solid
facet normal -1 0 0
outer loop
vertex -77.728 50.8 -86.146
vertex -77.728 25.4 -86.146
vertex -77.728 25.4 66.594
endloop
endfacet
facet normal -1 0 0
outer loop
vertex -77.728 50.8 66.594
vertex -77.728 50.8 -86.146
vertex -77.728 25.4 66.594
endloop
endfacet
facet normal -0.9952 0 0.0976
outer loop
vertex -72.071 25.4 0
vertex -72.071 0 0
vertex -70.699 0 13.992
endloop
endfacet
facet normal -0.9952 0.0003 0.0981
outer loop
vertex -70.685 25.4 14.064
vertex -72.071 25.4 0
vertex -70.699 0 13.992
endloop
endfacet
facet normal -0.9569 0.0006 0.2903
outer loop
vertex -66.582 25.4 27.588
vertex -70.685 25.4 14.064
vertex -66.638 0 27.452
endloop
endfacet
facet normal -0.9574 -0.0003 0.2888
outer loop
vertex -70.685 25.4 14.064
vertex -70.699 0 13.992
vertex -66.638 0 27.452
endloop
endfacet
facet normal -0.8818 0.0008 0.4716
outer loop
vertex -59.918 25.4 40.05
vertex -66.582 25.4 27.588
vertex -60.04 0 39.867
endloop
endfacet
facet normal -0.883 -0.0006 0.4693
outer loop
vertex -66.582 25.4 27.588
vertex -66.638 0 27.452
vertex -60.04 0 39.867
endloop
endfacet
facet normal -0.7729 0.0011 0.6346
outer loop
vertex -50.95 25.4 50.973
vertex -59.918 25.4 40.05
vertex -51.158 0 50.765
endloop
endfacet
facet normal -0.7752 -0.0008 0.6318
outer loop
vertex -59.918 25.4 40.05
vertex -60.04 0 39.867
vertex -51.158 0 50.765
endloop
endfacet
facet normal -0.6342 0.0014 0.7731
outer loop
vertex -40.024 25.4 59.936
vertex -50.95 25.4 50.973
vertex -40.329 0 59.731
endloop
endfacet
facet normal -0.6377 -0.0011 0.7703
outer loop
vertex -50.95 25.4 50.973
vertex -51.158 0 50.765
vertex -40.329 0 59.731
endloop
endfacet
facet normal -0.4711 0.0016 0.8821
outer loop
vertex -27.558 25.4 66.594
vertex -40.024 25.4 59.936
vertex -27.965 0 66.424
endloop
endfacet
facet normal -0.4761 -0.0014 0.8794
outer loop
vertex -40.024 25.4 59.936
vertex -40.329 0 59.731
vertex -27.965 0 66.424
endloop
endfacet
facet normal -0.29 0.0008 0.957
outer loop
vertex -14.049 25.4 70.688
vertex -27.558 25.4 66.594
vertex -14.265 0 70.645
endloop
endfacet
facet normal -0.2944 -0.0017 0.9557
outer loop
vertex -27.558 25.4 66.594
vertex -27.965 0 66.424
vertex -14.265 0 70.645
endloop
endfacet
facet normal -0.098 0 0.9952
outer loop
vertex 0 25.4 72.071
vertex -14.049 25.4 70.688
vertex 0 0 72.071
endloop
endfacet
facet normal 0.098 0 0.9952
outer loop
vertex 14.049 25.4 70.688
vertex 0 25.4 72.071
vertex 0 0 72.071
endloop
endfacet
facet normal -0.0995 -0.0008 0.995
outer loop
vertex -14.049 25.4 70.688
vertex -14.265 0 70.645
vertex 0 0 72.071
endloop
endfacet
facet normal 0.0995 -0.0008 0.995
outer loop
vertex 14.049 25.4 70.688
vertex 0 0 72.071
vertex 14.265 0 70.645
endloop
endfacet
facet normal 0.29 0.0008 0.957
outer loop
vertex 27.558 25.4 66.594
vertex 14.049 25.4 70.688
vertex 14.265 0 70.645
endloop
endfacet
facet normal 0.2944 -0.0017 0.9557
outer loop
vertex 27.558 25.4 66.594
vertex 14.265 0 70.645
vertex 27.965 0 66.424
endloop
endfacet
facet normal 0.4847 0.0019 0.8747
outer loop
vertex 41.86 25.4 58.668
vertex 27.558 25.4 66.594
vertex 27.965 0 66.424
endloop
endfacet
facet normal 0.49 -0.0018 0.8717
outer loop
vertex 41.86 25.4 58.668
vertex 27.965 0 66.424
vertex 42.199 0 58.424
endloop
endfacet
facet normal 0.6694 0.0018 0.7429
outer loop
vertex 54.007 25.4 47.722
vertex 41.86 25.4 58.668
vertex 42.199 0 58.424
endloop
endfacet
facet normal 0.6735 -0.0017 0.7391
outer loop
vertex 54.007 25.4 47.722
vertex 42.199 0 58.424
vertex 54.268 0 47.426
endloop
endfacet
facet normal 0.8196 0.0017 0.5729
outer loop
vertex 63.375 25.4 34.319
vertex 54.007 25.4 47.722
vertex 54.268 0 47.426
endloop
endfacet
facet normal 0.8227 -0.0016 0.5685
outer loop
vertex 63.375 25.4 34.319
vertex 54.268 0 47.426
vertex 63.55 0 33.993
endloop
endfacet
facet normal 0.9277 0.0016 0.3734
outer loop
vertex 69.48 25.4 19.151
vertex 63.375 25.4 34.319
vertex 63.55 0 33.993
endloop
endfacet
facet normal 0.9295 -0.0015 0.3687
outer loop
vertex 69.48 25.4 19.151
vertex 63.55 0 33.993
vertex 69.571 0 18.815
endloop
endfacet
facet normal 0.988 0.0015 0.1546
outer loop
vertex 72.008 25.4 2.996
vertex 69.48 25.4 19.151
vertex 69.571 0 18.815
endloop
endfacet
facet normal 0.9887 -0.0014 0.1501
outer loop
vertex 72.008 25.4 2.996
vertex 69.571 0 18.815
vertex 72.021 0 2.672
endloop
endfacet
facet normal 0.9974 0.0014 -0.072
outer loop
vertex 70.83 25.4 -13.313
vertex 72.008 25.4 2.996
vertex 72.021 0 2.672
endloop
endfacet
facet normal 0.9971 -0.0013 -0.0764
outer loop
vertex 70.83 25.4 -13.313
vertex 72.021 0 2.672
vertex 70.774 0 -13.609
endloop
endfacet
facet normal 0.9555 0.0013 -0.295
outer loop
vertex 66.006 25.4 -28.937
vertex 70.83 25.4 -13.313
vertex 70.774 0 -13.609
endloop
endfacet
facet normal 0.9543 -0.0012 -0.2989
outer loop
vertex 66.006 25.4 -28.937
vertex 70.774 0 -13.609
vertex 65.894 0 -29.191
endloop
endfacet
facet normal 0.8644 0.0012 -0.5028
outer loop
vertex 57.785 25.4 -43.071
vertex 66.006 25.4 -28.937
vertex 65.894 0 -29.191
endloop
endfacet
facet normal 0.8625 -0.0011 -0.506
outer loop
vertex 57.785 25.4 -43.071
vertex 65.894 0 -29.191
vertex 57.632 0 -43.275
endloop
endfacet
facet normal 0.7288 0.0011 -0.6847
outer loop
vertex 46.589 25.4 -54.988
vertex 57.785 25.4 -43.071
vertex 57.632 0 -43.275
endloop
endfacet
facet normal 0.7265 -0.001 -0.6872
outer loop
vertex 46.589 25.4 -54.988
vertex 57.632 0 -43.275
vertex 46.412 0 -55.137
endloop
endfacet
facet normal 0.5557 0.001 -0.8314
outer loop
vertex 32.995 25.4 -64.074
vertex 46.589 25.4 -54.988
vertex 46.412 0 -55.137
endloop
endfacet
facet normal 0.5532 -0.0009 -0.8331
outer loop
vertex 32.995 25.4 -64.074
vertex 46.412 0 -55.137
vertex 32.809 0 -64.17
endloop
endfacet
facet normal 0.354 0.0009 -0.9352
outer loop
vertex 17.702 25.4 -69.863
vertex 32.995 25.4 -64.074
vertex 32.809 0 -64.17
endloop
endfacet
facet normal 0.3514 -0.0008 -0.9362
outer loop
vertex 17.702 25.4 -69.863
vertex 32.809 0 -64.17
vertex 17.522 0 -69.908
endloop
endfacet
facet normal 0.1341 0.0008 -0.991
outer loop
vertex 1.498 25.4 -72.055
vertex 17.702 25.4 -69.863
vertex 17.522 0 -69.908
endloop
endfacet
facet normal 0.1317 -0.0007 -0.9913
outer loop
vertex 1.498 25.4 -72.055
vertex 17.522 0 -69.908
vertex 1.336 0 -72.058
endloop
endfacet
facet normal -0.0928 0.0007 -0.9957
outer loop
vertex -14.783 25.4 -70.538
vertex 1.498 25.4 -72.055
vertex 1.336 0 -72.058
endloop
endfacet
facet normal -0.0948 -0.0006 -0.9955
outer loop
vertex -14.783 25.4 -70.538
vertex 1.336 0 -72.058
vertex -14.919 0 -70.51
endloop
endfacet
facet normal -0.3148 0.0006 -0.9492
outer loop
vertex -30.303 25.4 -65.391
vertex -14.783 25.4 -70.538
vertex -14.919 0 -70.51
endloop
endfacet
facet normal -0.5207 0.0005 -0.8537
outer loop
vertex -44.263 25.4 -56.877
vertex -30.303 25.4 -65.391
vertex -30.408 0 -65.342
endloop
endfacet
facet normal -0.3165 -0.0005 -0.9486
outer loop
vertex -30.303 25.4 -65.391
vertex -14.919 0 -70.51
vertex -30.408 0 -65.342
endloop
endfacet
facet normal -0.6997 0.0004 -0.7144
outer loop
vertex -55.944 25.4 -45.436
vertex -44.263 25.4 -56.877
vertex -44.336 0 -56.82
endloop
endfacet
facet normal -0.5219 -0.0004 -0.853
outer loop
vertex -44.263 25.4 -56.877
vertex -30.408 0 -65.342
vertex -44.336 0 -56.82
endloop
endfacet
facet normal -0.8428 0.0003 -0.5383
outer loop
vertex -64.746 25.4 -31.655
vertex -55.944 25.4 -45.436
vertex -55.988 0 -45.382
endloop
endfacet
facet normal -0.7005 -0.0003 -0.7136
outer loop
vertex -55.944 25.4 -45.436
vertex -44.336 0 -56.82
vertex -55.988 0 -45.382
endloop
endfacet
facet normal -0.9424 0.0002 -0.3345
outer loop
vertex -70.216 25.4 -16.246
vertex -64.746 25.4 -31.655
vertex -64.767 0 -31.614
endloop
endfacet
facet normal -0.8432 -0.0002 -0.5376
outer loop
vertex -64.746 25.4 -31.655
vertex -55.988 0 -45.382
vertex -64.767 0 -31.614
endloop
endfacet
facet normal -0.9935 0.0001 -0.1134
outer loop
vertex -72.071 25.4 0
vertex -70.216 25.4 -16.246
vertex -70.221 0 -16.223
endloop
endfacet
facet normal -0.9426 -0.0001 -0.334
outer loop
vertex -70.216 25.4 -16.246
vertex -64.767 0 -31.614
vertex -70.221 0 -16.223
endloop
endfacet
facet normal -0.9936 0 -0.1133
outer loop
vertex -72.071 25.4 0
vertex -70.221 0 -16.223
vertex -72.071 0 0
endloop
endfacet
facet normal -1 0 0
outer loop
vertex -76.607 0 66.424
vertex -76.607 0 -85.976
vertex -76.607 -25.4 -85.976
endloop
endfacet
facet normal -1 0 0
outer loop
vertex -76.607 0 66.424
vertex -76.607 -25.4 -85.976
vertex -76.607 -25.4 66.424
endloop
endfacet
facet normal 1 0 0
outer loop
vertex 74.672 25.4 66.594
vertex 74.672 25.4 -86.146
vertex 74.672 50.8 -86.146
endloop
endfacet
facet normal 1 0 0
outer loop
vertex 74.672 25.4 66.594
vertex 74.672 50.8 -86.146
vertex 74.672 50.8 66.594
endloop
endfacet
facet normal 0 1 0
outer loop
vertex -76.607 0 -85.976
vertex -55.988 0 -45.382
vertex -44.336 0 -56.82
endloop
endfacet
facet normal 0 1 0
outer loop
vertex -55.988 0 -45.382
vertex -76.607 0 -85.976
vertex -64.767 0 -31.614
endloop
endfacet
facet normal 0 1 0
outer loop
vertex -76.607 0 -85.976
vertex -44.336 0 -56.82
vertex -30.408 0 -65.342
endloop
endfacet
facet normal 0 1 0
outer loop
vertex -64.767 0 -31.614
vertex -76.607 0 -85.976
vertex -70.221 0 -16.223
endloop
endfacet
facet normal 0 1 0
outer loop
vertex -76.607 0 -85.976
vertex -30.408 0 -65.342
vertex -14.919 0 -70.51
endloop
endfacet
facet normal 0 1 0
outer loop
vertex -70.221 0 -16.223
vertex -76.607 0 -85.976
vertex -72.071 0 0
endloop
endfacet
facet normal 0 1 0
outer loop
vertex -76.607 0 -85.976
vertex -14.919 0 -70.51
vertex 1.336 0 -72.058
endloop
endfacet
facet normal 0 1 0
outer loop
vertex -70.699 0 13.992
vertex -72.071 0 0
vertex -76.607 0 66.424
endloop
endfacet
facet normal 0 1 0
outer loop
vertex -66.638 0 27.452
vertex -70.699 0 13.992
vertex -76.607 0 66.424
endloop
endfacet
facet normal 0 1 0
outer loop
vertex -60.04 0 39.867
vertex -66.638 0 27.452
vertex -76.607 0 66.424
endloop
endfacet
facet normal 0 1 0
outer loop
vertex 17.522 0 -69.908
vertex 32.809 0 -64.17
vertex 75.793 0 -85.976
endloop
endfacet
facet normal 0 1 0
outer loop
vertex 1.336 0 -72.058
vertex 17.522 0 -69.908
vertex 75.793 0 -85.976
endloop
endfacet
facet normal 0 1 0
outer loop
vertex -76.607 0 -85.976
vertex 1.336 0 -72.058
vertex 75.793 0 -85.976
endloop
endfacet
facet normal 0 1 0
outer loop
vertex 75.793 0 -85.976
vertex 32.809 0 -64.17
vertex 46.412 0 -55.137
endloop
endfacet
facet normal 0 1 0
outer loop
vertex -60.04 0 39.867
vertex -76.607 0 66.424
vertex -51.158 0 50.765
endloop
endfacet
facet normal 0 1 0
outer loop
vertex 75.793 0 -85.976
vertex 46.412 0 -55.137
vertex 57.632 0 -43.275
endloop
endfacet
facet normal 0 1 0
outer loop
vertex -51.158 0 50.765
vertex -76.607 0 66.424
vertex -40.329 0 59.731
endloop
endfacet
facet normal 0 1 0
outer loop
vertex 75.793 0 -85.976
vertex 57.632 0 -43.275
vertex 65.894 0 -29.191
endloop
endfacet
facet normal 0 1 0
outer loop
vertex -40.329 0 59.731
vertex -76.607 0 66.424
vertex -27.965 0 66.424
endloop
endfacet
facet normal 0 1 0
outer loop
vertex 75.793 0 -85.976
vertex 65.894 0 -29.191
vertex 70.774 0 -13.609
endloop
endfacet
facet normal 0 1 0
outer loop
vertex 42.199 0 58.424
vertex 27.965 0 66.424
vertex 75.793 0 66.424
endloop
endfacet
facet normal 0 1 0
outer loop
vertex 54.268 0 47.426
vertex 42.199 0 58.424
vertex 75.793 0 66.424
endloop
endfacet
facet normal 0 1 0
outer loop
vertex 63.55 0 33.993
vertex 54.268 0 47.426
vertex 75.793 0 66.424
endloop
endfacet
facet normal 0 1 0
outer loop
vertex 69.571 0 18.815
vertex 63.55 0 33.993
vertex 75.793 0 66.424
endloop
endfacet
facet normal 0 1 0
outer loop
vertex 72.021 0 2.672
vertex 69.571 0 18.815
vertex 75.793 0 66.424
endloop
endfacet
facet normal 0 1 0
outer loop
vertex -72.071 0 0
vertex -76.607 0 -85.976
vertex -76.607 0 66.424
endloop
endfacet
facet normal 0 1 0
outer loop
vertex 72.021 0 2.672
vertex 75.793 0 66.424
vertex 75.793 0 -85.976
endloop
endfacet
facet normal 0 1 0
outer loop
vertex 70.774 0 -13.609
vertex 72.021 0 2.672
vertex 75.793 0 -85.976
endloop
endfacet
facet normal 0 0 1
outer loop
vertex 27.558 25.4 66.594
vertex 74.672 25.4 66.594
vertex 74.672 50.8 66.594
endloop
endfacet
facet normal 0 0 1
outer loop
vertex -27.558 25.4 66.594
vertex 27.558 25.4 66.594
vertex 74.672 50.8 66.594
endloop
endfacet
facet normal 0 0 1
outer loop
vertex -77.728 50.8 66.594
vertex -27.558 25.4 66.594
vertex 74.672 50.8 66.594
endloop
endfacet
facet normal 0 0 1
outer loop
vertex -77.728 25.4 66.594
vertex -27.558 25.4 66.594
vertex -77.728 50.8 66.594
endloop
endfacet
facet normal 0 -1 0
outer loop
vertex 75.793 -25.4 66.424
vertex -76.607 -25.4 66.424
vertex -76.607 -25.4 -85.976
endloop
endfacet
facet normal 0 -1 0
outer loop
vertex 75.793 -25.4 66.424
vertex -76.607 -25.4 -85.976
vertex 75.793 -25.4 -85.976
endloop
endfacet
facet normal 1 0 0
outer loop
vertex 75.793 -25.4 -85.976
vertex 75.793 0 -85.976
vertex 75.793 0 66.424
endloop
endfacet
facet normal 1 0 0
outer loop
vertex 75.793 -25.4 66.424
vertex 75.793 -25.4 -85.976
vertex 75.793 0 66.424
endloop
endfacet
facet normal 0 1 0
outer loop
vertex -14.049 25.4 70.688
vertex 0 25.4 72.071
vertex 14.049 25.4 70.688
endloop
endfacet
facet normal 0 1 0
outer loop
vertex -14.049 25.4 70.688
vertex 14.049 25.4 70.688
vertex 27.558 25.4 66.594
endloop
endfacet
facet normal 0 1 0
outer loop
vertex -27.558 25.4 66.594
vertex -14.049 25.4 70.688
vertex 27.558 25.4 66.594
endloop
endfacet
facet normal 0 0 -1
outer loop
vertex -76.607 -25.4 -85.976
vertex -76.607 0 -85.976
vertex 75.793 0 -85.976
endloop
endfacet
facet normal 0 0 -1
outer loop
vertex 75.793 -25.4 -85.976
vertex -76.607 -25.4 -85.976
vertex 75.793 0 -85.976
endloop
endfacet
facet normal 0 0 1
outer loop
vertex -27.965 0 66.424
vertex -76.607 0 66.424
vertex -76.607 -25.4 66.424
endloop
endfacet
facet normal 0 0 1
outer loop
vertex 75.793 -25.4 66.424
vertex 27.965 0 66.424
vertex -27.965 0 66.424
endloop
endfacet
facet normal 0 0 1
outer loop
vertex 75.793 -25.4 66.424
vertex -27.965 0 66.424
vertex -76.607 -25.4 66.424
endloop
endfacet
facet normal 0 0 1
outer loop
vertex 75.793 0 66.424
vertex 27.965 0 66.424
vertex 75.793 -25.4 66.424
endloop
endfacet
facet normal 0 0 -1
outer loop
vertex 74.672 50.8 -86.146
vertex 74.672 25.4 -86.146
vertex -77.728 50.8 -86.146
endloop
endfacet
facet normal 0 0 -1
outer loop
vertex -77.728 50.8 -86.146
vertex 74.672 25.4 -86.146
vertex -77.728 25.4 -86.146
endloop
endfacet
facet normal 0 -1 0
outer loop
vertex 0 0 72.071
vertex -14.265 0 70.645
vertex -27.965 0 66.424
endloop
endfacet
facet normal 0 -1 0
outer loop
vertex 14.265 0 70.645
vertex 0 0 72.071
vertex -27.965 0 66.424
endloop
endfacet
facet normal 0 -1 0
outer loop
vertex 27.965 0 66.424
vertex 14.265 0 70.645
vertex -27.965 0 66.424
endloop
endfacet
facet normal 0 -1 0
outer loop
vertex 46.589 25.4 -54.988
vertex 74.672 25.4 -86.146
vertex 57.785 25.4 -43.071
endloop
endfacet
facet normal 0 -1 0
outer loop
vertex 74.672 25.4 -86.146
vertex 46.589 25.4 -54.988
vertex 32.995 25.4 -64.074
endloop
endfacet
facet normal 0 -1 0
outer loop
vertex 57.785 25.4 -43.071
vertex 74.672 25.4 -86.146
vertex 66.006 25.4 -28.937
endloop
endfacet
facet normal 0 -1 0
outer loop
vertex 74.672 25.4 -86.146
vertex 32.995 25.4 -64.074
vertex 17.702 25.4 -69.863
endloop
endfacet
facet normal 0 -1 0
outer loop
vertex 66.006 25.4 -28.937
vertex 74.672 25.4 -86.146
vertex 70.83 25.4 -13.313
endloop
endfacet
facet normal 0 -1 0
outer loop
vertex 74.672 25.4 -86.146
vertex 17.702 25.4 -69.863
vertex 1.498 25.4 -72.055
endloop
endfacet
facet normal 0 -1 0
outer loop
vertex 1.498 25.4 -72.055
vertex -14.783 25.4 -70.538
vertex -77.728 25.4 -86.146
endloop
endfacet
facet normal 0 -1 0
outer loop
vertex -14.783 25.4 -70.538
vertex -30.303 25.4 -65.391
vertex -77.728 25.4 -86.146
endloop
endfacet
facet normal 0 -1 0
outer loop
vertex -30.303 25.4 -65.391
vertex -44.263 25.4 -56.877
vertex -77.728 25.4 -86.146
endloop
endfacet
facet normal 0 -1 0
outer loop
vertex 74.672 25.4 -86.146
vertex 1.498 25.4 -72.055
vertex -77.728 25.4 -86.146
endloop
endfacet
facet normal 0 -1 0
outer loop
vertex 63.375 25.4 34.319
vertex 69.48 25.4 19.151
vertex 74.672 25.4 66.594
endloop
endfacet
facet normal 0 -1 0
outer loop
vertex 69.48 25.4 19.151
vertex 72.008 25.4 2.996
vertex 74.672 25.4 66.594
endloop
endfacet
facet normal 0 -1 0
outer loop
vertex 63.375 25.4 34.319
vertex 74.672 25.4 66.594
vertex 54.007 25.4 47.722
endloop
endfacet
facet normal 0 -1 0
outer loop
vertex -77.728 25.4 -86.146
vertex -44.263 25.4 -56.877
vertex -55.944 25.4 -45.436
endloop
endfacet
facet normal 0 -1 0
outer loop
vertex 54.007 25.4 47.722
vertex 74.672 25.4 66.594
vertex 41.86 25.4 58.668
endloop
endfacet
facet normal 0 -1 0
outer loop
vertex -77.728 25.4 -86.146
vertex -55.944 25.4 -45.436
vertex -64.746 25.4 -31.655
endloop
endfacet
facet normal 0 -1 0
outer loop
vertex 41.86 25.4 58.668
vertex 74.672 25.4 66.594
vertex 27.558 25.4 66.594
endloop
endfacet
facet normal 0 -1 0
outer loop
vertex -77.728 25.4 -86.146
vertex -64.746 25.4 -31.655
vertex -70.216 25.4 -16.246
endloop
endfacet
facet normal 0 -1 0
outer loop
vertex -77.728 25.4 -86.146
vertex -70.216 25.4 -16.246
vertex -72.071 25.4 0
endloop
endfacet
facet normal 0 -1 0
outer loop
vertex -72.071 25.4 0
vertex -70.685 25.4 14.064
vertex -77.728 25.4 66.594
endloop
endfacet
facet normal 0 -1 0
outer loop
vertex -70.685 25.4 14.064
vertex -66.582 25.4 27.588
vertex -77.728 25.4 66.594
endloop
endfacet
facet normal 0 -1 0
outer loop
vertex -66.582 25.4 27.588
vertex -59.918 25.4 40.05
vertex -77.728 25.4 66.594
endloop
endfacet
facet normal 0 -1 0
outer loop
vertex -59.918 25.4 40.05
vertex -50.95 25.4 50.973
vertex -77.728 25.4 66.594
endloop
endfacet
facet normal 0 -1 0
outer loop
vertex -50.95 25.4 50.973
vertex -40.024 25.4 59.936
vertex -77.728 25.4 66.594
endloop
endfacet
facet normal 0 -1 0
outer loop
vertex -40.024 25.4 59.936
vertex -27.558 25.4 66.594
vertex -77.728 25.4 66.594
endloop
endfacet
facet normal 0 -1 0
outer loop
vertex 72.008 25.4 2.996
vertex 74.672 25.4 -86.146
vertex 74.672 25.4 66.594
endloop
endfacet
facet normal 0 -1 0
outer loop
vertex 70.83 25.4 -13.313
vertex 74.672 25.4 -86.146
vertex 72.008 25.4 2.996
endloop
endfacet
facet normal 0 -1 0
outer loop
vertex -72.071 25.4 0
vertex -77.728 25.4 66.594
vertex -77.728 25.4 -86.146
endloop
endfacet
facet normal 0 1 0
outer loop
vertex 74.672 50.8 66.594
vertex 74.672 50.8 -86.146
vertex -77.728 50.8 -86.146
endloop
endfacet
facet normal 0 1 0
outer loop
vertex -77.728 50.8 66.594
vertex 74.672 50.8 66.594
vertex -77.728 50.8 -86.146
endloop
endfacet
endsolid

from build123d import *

# Parameters (mm, degrees)
F0_W     = 152.4
F0_H     = 152.4
F1_DEPTH = 25.4
F2_R     = 72.070602
F3_DEPTH = 25.4
F4_W     = 152.4
F4_H     = 152.73941
F5_DEPTH = 25.4


with BuildPart() as f1:
    # F0 (on Front) → F1 (new body)
    with BuildSketch(Plane.XZ):
        with Locations((-0.407152, -9.77602)):
            Rectangle(F0_W, F0_H)
    extrude(amount=F1_DEPTH)

    # F2 (on face) → F3 (join)
    with BuildSketch(Plane(origin=(0, 0, 0), x_dir=(-1, 0, 0), z_dir=(0, 1, 0))):
        Circle(F2_R)
    extrude(amount=F3_DEPTH)

    # F4 (on face) → F5 (join)
    with BuildSketch(Plane(origin=(0, 25.4, 0), x_dir=(-1, 0, 0), z_dir=(0, 1, 0))):
        with Locations((1.527745, -9.776019)):
            Rectangle(F4_W, F4_H)
    extrude(amount=F5_DEPTH)


solid = f1.part
